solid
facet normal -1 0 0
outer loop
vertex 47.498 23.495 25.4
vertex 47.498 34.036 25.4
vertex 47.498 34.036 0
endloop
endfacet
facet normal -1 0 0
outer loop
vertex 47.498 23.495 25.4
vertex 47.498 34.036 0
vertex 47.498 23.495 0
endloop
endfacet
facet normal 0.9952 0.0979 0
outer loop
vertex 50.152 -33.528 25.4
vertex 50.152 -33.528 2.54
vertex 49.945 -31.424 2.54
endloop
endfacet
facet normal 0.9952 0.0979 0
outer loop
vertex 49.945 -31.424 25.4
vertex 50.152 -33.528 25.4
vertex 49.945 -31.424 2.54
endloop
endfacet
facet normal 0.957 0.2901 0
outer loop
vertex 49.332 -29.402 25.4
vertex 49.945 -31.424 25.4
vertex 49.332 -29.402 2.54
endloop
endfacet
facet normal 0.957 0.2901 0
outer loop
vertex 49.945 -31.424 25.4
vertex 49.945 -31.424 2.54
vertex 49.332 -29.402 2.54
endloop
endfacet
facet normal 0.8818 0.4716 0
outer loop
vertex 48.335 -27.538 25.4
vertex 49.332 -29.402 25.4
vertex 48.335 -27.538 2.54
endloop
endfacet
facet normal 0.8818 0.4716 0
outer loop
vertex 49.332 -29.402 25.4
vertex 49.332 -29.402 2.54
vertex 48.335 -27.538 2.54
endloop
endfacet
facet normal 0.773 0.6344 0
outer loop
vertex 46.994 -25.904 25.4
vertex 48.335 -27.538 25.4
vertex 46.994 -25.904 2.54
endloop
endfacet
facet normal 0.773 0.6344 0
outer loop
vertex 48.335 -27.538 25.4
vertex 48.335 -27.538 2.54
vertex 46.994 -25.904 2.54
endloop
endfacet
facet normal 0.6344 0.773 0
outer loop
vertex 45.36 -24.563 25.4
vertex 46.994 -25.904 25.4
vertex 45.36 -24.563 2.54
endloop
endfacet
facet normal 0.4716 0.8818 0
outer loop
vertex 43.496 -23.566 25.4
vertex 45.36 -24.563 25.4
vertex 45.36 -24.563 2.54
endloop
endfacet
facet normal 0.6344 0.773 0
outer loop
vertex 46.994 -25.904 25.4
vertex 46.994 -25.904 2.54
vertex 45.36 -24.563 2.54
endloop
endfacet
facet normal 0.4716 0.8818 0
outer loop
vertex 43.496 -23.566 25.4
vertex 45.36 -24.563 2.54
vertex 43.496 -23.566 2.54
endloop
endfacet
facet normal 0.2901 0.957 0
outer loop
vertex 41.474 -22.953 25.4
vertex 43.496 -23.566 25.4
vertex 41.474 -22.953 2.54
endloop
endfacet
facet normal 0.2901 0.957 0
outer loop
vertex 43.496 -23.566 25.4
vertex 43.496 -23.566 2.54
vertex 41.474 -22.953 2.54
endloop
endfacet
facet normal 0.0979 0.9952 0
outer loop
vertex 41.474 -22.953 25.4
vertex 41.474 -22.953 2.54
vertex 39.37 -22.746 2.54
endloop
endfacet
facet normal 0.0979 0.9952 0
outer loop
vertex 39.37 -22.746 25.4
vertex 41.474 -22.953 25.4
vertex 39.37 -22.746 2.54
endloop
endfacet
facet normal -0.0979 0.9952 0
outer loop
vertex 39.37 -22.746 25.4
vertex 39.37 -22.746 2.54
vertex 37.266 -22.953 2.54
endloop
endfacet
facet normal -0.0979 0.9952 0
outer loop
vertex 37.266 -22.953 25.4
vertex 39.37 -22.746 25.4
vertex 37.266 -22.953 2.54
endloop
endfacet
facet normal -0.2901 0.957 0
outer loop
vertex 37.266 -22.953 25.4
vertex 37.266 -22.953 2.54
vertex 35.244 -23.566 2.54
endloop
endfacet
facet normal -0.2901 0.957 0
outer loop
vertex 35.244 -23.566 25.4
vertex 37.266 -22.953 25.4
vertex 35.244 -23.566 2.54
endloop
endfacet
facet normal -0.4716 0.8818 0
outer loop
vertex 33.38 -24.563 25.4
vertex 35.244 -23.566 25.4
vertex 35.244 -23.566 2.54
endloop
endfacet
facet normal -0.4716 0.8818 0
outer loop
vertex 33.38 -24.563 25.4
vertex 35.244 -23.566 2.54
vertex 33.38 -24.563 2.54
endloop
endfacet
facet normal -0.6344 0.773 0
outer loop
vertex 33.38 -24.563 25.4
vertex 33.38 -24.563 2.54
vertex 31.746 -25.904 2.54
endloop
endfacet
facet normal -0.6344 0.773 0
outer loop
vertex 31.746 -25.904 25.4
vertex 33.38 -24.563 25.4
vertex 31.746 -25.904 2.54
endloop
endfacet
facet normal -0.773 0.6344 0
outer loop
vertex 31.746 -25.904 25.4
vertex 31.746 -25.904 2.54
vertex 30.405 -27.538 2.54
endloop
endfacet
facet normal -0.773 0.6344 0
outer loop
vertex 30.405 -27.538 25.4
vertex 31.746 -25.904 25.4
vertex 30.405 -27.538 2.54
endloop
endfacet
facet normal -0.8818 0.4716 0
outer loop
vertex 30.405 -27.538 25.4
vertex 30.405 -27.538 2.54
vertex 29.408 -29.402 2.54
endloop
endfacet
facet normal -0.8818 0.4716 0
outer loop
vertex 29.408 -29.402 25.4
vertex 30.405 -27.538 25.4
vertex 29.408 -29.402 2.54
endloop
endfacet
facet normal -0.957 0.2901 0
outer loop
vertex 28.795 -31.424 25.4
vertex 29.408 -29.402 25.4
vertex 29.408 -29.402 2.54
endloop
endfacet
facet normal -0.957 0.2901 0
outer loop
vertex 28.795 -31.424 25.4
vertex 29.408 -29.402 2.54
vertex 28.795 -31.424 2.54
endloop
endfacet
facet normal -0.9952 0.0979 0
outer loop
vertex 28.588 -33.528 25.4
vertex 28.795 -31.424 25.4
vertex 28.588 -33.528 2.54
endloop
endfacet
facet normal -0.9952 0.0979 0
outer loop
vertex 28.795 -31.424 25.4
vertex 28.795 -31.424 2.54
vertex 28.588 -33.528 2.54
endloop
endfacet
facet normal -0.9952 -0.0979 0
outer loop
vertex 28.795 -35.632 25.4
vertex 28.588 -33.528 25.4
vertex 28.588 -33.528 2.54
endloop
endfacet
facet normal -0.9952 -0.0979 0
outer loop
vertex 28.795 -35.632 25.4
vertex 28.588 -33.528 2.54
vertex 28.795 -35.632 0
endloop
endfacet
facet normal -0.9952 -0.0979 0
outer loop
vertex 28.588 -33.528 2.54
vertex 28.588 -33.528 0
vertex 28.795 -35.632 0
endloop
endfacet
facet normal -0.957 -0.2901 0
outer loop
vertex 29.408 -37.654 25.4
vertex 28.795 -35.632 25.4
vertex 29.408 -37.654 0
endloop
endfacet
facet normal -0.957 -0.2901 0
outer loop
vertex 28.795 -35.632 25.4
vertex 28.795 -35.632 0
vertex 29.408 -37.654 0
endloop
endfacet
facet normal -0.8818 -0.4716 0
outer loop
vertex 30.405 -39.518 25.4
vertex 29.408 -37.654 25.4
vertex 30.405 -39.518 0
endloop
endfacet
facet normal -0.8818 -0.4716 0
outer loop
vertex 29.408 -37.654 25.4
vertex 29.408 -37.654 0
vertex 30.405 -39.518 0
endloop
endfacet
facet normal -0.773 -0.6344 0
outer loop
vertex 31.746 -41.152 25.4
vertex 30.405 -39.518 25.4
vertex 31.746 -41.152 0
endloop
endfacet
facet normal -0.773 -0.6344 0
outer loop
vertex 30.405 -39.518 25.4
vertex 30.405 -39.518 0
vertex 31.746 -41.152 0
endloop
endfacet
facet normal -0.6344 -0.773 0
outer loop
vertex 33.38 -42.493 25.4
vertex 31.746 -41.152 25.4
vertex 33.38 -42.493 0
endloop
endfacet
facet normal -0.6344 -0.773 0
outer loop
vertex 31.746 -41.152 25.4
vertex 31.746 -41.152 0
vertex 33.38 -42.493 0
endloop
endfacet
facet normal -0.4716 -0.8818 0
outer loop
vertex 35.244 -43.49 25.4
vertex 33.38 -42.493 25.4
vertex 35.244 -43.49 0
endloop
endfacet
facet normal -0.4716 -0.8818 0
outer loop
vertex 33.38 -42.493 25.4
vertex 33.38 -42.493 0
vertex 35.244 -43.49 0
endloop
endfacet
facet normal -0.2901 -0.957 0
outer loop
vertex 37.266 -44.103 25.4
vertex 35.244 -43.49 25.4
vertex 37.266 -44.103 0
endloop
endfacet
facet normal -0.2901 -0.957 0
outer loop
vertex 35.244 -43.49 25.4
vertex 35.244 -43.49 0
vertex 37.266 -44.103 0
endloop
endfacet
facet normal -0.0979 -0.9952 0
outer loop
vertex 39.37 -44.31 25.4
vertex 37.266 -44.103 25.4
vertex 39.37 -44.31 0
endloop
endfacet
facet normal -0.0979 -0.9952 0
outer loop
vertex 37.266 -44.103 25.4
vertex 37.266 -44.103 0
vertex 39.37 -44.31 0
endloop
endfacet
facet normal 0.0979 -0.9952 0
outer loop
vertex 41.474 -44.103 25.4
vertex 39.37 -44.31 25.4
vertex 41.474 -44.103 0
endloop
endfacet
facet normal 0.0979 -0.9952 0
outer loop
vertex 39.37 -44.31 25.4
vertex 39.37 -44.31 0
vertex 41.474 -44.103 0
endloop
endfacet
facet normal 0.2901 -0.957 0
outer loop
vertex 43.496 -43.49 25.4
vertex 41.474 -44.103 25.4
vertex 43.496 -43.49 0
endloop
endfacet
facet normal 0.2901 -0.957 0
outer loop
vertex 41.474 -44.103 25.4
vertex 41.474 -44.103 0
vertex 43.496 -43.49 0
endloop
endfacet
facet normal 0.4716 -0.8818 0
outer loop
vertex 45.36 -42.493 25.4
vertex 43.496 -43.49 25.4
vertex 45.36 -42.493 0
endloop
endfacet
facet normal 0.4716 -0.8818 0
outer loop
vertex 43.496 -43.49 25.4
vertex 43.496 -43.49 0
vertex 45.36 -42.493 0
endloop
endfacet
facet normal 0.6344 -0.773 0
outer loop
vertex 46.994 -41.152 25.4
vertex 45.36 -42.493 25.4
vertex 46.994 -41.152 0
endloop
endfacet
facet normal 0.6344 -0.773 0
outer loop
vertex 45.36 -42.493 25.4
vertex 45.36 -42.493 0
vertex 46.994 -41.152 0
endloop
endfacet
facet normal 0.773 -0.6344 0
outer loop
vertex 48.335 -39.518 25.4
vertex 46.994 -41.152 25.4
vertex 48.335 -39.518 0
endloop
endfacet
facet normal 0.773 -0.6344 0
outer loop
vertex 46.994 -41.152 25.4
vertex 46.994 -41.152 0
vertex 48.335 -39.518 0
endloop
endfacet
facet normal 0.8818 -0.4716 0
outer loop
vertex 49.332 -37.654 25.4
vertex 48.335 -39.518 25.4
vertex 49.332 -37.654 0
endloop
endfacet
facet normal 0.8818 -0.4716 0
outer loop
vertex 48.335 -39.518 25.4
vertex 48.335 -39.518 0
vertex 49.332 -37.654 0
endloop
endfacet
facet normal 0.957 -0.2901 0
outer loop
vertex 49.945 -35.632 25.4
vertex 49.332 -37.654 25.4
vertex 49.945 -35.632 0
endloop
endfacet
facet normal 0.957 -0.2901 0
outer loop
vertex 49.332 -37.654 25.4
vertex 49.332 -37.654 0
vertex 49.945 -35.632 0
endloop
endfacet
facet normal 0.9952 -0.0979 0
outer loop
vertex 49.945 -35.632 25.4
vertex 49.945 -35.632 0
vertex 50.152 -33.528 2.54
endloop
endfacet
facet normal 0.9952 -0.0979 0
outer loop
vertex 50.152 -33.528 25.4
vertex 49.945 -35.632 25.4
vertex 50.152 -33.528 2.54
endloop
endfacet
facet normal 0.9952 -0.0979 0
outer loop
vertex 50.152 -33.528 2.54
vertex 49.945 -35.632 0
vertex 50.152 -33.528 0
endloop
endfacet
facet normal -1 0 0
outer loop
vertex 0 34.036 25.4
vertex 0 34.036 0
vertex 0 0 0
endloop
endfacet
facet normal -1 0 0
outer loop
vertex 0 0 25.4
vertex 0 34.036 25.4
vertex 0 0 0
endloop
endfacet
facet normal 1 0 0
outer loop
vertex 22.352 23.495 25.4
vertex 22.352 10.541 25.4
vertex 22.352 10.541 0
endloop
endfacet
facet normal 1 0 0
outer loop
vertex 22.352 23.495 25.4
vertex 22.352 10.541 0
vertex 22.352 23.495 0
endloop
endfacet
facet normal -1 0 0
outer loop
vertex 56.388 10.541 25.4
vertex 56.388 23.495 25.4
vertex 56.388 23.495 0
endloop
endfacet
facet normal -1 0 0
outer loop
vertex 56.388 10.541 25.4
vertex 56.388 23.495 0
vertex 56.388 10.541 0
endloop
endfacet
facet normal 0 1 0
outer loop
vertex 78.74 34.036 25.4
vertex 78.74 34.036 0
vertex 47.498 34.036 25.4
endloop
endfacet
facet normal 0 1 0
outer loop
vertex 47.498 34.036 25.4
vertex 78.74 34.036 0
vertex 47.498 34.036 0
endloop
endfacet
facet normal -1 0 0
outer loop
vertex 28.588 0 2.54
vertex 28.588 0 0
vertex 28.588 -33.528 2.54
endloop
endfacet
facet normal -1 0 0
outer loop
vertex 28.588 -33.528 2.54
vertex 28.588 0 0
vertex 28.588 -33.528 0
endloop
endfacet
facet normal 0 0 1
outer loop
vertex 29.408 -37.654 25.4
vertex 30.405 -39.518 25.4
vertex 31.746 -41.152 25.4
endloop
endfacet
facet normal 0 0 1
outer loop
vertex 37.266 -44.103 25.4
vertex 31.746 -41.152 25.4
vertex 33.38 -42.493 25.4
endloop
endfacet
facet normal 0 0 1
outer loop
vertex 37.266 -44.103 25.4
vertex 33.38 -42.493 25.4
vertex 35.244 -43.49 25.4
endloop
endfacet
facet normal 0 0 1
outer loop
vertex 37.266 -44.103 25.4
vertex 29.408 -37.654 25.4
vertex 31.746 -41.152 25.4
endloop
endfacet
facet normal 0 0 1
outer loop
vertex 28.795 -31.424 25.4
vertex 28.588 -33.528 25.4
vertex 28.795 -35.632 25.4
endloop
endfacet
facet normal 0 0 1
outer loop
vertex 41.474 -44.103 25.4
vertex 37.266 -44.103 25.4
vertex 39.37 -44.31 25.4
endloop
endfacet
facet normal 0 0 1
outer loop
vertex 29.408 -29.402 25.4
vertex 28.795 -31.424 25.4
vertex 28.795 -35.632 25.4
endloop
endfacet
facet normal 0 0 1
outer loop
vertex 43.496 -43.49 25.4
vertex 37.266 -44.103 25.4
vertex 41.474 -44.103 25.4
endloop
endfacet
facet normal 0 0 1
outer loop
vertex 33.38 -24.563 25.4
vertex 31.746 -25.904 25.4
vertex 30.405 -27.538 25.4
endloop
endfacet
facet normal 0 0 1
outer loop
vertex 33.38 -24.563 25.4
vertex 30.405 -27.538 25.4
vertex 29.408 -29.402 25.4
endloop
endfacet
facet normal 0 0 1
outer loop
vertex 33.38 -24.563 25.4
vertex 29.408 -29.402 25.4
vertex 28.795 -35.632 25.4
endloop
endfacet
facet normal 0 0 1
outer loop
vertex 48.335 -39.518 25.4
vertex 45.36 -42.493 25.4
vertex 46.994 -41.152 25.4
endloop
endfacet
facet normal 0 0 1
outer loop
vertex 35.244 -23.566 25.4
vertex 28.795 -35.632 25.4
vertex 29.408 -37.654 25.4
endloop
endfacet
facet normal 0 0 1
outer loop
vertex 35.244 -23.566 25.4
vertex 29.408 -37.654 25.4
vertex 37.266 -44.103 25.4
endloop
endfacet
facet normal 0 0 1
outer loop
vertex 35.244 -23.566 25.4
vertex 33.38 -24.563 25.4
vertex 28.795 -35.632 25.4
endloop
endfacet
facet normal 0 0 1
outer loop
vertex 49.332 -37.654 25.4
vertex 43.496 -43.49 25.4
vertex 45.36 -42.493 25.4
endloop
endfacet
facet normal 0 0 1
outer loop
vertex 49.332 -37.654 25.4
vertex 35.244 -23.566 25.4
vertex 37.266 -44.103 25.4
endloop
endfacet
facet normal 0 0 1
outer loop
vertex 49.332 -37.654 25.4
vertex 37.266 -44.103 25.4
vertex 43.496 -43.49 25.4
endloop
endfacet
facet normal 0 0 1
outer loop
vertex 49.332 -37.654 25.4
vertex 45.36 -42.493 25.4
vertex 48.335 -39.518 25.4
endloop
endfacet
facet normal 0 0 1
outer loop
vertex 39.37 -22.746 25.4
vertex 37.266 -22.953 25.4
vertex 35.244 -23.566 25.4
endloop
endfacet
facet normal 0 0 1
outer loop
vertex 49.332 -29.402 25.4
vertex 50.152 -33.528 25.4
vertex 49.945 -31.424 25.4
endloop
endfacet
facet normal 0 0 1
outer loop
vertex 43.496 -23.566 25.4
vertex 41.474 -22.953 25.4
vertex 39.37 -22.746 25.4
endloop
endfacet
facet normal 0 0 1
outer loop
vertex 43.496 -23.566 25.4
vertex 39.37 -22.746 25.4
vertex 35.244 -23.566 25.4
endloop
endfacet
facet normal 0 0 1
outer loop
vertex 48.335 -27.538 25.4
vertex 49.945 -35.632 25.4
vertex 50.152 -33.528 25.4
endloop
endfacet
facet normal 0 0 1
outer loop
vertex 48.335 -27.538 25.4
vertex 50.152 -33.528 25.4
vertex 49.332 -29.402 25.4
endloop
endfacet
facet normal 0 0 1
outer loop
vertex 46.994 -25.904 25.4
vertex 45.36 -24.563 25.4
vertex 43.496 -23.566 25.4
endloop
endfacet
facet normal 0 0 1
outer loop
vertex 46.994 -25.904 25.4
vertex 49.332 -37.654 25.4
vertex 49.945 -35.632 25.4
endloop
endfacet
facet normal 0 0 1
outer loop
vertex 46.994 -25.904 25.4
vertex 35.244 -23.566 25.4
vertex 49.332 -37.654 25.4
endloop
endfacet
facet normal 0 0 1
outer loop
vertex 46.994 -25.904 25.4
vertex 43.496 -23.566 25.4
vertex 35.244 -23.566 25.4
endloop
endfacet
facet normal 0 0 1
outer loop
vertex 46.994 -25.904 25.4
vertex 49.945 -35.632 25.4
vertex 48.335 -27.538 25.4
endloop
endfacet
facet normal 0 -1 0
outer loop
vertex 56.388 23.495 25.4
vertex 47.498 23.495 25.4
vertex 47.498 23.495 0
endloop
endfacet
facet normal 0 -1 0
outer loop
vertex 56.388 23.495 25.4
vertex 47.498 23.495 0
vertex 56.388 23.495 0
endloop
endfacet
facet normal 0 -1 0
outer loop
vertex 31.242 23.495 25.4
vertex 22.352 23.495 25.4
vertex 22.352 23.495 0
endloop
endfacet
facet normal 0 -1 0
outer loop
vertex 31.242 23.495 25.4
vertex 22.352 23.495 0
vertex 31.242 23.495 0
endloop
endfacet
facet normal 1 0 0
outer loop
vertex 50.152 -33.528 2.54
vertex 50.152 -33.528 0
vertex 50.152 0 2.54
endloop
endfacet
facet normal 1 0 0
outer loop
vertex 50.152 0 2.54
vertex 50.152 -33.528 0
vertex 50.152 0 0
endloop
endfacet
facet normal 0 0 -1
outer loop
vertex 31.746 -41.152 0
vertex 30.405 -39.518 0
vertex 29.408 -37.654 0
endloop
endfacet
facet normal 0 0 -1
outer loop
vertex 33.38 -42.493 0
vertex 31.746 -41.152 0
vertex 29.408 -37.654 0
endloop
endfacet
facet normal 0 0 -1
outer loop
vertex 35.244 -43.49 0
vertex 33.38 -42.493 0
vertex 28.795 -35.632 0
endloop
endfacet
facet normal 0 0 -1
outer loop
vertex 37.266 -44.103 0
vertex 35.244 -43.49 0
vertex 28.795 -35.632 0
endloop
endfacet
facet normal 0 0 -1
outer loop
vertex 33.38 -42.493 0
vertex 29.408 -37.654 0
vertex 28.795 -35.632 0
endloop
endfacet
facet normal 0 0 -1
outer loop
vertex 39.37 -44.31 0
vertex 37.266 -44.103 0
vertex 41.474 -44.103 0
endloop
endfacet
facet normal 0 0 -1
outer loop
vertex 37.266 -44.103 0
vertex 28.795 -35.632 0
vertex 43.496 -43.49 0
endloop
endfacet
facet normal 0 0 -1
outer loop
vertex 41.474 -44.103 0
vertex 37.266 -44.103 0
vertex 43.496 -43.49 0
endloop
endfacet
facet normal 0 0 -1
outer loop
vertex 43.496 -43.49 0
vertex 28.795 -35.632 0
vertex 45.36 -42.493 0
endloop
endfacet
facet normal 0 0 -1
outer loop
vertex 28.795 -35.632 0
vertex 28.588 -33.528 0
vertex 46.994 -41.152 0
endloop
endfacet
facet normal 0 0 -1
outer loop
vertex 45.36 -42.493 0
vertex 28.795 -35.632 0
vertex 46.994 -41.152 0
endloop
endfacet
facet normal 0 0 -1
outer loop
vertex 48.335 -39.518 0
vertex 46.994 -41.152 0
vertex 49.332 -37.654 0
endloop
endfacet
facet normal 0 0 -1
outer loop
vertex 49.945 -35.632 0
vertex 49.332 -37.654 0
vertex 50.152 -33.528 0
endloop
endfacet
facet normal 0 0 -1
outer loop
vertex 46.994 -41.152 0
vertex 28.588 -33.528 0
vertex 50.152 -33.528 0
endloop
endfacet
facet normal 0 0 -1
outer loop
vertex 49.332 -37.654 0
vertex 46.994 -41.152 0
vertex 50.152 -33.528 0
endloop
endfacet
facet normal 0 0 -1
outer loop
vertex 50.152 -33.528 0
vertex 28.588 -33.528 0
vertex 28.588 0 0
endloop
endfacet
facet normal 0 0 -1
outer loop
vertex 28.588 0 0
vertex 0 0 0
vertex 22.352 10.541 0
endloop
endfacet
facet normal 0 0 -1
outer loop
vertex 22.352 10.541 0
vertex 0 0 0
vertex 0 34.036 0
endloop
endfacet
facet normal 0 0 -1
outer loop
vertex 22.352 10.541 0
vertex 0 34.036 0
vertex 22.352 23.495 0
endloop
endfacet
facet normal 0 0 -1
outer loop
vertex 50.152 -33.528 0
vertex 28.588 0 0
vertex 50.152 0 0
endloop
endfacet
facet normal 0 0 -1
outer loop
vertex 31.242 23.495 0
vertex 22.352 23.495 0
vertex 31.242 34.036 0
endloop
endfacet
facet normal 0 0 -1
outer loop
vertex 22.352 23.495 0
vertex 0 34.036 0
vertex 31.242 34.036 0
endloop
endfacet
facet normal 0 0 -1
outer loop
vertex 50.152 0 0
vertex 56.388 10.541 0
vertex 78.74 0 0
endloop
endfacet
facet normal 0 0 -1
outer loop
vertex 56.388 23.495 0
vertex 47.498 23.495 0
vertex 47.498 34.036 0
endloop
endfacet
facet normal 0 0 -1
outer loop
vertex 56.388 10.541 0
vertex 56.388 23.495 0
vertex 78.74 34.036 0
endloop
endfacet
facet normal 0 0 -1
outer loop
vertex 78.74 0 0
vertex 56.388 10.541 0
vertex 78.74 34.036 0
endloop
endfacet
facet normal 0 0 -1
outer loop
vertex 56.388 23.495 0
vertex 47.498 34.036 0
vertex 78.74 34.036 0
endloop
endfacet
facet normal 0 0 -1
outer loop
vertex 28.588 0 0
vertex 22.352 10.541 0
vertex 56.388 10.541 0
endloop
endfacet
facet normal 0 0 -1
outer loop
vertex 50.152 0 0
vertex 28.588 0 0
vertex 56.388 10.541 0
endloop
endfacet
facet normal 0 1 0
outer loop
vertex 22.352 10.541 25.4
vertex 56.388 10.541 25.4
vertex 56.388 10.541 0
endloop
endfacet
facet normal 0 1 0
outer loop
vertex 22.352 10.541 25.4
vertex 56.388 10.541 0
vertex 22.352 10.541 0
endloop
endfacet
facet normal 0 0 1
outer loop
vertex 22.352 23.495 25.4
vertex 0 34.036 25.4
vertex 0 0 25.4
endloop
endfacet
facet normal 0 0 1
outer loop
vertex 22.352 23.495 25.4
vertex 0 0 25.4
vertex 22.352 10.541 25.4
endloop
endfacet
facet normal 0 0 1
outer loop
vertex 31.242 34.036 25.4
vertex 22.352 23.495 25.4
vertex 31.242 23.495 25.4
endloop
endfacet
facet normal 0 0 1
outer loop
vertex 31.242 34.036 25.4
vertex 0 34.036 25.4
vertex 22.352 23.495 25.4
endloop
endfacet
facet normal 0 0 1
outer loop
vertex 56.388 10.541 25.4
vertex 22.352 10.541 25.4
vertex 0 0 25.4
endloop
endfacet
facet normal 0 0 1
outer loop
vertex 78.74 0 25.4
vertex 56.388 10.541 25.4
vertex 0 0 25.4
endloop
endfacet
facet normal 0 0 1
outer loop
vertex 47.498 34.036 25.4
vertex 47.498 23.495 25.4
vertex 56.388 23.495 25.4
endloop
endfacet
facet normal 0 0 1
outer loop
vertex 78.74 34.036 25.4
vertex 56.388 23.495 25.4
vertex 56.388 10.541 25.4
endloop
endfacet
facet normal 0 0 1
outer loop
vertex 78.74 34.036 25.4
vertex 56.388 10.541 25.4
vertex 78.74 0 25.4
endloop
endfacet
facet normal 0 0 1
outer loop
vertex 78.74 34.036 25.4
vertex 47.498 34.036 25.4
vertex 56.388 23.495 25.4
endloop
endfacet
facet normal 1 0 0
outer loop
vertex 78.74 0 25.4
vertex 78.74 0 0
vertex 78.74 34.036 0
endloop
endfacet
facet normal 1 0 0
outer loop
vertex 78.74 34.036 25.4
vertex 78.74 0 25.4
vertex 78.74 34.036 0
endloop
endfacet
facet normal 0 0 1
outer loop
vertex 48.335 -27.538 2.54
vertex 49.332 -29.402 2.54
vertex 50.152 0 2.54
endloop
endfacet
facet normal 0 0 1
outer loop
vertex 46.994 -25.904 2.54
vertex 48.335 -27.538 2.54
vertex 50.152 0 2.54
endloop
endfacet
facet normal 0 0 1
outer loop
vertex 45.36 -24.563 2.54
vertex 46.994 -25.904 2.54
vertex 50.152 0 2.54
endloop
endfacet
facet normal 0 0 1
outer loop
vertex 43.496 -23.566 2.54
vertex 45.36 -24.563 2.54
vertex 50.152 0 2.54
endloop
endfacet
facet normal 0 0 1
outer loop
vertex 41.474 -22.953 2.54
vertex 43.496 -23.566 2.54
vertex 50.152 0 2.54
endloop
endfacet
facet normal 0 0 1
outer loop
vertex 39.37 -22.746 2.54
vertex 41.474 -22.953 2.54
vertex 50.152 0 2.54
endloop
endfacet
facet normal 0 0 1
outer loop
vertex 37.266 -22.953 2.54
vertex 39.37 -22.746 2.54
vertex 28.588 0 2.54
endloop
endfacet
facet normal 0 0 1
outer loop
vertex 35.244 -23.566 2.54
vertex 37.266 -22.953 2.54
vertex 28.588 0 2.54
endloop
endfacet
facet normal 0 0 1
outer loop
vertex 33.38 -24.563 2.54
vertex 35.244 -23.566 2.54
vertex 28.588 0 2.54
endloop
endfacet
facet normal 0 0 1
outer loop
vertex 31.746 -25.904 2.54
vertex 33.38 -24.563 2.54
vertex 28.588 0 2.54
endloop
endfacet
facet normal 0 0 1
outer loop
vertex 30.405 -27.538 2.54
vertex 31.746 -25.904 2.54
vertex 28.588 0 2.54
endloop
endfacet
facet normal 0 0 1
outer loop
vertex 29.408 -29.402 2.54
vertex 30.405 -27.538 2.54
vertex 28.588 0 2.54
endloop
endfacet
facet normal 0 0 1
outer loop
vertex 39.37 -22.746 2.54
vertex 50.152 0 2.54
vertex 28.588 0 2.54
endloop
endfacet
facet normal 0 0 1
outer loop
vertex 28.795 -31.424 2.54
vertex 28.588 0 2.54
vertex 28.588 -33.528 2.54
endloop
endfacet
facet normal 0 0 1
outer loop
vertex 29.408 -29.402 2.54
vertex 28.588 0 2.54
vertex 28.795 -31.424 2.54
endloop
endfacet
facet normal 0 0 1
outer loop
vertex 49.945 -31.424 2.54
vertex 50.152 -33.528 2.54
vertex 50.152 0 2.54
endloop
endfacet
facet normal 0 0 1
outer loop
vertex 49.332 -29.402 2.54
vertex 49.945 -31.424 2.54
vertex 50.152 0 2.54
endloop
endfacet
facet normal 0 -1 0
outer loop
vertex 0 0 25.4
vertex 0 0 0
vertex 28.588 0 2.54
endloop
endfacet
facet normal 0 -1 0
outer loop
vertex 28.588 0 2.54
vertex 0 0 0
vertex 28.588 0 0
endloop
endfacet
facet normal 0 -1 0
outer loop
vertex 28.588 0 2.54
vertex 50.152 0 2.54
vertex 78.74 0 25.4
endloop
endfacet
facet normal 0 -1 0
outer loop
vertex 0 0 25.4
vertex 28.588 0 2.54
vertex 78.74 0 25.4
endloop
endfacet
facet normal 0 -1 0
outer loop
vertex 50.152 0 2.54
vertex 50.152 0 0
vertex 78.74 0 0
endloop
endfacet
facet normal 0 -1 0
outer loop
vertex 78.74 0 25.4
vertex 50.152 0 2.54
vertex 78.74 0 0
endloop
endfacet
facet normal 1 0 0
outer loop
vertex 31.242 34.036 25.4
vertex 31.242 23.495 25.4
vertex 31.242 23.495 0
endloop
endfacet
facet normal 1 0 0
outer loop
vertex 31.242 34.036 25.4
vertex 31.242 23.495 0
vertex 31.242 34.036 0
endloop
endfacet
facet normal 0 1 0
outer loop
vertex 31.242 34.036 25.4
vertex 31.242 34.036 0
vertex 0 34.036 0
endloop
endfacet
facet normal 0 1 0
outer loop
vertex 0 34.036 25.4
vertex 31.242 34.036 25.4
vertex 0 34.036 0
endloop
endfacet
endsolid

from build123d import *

# Parameters (mm, degrees)
BOSS_EXTRUDE3_DEPTH = 25.4
CUT_EXTRUDE2_DEPTH  = 94.85387731
CUT_EXTRUDE3_START  = -22.86
CUT_EXTRUDE3_DEPTH  = 22.86
SKETCH8_R           = 10.7823
BOSS_EXTRUDE4_DEPTH = 22.86


with BuildPart() as part:
    # Sketch4 → Boss-Extrude3 (new body)
    with BuildSketch(Plane.XY):
        with BuildLine():
            Line((0, 0), (28.5877, 0))
            Line((28.5877, 0), (28.5877, -33.528))
            ThreePointArc((28.5877, -33.528), (39.37, -44.3103), (50.1523, -33.528))
            Line((50.1523, -33.528), (50.1523, 0))
            Line((50.1523, 0), (78.74, 0))
            Line((78.74, 0), (78.74, 34.036))
            Line((78.74, 34.036), (0, 34.036))
            Line((0, 34.036), (0, 0))
        make_face()
    extrude(amount=BOSS_EXTRUDE3_DEPTH)

    # Sketch5 → Cut-Extrude2 (cut, through all)
    with BuildSketch(Plane.XY.offset(25.4)):
        Polygon((47.498, 23.495), (56.388, 23.495), (56.388, 10.541), (22.352, 10.541), (22.352, 23.495), (31.242, 23.495), (31.242, 34.036), (47.498, 34.036), align=None)
    extrude(amount=-CUT_EXTRUDE2_DEPTH, mode=Mode.SUBTRACT)

    # Sketch7 → Cut-Extrude3 (cut)
    with BuildSketch(Plane.XY.offset(25.4).offset(CUT_EXTRUDE3_START)):
        with BuildLine():
            Line((28.5877, 0), (50.1523, 0))
            Line((50.1523, 0), (50.1523, -33.528))
            ThreePointArc((50.1523, -33.528), (39.37, -44.3103), (28.5877, -33.528))
            Line((28.5877, -33.528), (28.5877, 0))
        make_face()
    extrude(amount=CUT_EXTRUDE3_DEPTH, mode=Mode.SUBTRACT)

    # Sketch8 → Boss-Extrude4 (add)
    with BuildSketch(Plane.XY.offset(2.54)):
        with Locations((39.37, -33.528)):
            Circle(SKETCH8_R)
    extrude(amount=BOSS_EXTRUDE4_DEPTH)


solid = part.part
